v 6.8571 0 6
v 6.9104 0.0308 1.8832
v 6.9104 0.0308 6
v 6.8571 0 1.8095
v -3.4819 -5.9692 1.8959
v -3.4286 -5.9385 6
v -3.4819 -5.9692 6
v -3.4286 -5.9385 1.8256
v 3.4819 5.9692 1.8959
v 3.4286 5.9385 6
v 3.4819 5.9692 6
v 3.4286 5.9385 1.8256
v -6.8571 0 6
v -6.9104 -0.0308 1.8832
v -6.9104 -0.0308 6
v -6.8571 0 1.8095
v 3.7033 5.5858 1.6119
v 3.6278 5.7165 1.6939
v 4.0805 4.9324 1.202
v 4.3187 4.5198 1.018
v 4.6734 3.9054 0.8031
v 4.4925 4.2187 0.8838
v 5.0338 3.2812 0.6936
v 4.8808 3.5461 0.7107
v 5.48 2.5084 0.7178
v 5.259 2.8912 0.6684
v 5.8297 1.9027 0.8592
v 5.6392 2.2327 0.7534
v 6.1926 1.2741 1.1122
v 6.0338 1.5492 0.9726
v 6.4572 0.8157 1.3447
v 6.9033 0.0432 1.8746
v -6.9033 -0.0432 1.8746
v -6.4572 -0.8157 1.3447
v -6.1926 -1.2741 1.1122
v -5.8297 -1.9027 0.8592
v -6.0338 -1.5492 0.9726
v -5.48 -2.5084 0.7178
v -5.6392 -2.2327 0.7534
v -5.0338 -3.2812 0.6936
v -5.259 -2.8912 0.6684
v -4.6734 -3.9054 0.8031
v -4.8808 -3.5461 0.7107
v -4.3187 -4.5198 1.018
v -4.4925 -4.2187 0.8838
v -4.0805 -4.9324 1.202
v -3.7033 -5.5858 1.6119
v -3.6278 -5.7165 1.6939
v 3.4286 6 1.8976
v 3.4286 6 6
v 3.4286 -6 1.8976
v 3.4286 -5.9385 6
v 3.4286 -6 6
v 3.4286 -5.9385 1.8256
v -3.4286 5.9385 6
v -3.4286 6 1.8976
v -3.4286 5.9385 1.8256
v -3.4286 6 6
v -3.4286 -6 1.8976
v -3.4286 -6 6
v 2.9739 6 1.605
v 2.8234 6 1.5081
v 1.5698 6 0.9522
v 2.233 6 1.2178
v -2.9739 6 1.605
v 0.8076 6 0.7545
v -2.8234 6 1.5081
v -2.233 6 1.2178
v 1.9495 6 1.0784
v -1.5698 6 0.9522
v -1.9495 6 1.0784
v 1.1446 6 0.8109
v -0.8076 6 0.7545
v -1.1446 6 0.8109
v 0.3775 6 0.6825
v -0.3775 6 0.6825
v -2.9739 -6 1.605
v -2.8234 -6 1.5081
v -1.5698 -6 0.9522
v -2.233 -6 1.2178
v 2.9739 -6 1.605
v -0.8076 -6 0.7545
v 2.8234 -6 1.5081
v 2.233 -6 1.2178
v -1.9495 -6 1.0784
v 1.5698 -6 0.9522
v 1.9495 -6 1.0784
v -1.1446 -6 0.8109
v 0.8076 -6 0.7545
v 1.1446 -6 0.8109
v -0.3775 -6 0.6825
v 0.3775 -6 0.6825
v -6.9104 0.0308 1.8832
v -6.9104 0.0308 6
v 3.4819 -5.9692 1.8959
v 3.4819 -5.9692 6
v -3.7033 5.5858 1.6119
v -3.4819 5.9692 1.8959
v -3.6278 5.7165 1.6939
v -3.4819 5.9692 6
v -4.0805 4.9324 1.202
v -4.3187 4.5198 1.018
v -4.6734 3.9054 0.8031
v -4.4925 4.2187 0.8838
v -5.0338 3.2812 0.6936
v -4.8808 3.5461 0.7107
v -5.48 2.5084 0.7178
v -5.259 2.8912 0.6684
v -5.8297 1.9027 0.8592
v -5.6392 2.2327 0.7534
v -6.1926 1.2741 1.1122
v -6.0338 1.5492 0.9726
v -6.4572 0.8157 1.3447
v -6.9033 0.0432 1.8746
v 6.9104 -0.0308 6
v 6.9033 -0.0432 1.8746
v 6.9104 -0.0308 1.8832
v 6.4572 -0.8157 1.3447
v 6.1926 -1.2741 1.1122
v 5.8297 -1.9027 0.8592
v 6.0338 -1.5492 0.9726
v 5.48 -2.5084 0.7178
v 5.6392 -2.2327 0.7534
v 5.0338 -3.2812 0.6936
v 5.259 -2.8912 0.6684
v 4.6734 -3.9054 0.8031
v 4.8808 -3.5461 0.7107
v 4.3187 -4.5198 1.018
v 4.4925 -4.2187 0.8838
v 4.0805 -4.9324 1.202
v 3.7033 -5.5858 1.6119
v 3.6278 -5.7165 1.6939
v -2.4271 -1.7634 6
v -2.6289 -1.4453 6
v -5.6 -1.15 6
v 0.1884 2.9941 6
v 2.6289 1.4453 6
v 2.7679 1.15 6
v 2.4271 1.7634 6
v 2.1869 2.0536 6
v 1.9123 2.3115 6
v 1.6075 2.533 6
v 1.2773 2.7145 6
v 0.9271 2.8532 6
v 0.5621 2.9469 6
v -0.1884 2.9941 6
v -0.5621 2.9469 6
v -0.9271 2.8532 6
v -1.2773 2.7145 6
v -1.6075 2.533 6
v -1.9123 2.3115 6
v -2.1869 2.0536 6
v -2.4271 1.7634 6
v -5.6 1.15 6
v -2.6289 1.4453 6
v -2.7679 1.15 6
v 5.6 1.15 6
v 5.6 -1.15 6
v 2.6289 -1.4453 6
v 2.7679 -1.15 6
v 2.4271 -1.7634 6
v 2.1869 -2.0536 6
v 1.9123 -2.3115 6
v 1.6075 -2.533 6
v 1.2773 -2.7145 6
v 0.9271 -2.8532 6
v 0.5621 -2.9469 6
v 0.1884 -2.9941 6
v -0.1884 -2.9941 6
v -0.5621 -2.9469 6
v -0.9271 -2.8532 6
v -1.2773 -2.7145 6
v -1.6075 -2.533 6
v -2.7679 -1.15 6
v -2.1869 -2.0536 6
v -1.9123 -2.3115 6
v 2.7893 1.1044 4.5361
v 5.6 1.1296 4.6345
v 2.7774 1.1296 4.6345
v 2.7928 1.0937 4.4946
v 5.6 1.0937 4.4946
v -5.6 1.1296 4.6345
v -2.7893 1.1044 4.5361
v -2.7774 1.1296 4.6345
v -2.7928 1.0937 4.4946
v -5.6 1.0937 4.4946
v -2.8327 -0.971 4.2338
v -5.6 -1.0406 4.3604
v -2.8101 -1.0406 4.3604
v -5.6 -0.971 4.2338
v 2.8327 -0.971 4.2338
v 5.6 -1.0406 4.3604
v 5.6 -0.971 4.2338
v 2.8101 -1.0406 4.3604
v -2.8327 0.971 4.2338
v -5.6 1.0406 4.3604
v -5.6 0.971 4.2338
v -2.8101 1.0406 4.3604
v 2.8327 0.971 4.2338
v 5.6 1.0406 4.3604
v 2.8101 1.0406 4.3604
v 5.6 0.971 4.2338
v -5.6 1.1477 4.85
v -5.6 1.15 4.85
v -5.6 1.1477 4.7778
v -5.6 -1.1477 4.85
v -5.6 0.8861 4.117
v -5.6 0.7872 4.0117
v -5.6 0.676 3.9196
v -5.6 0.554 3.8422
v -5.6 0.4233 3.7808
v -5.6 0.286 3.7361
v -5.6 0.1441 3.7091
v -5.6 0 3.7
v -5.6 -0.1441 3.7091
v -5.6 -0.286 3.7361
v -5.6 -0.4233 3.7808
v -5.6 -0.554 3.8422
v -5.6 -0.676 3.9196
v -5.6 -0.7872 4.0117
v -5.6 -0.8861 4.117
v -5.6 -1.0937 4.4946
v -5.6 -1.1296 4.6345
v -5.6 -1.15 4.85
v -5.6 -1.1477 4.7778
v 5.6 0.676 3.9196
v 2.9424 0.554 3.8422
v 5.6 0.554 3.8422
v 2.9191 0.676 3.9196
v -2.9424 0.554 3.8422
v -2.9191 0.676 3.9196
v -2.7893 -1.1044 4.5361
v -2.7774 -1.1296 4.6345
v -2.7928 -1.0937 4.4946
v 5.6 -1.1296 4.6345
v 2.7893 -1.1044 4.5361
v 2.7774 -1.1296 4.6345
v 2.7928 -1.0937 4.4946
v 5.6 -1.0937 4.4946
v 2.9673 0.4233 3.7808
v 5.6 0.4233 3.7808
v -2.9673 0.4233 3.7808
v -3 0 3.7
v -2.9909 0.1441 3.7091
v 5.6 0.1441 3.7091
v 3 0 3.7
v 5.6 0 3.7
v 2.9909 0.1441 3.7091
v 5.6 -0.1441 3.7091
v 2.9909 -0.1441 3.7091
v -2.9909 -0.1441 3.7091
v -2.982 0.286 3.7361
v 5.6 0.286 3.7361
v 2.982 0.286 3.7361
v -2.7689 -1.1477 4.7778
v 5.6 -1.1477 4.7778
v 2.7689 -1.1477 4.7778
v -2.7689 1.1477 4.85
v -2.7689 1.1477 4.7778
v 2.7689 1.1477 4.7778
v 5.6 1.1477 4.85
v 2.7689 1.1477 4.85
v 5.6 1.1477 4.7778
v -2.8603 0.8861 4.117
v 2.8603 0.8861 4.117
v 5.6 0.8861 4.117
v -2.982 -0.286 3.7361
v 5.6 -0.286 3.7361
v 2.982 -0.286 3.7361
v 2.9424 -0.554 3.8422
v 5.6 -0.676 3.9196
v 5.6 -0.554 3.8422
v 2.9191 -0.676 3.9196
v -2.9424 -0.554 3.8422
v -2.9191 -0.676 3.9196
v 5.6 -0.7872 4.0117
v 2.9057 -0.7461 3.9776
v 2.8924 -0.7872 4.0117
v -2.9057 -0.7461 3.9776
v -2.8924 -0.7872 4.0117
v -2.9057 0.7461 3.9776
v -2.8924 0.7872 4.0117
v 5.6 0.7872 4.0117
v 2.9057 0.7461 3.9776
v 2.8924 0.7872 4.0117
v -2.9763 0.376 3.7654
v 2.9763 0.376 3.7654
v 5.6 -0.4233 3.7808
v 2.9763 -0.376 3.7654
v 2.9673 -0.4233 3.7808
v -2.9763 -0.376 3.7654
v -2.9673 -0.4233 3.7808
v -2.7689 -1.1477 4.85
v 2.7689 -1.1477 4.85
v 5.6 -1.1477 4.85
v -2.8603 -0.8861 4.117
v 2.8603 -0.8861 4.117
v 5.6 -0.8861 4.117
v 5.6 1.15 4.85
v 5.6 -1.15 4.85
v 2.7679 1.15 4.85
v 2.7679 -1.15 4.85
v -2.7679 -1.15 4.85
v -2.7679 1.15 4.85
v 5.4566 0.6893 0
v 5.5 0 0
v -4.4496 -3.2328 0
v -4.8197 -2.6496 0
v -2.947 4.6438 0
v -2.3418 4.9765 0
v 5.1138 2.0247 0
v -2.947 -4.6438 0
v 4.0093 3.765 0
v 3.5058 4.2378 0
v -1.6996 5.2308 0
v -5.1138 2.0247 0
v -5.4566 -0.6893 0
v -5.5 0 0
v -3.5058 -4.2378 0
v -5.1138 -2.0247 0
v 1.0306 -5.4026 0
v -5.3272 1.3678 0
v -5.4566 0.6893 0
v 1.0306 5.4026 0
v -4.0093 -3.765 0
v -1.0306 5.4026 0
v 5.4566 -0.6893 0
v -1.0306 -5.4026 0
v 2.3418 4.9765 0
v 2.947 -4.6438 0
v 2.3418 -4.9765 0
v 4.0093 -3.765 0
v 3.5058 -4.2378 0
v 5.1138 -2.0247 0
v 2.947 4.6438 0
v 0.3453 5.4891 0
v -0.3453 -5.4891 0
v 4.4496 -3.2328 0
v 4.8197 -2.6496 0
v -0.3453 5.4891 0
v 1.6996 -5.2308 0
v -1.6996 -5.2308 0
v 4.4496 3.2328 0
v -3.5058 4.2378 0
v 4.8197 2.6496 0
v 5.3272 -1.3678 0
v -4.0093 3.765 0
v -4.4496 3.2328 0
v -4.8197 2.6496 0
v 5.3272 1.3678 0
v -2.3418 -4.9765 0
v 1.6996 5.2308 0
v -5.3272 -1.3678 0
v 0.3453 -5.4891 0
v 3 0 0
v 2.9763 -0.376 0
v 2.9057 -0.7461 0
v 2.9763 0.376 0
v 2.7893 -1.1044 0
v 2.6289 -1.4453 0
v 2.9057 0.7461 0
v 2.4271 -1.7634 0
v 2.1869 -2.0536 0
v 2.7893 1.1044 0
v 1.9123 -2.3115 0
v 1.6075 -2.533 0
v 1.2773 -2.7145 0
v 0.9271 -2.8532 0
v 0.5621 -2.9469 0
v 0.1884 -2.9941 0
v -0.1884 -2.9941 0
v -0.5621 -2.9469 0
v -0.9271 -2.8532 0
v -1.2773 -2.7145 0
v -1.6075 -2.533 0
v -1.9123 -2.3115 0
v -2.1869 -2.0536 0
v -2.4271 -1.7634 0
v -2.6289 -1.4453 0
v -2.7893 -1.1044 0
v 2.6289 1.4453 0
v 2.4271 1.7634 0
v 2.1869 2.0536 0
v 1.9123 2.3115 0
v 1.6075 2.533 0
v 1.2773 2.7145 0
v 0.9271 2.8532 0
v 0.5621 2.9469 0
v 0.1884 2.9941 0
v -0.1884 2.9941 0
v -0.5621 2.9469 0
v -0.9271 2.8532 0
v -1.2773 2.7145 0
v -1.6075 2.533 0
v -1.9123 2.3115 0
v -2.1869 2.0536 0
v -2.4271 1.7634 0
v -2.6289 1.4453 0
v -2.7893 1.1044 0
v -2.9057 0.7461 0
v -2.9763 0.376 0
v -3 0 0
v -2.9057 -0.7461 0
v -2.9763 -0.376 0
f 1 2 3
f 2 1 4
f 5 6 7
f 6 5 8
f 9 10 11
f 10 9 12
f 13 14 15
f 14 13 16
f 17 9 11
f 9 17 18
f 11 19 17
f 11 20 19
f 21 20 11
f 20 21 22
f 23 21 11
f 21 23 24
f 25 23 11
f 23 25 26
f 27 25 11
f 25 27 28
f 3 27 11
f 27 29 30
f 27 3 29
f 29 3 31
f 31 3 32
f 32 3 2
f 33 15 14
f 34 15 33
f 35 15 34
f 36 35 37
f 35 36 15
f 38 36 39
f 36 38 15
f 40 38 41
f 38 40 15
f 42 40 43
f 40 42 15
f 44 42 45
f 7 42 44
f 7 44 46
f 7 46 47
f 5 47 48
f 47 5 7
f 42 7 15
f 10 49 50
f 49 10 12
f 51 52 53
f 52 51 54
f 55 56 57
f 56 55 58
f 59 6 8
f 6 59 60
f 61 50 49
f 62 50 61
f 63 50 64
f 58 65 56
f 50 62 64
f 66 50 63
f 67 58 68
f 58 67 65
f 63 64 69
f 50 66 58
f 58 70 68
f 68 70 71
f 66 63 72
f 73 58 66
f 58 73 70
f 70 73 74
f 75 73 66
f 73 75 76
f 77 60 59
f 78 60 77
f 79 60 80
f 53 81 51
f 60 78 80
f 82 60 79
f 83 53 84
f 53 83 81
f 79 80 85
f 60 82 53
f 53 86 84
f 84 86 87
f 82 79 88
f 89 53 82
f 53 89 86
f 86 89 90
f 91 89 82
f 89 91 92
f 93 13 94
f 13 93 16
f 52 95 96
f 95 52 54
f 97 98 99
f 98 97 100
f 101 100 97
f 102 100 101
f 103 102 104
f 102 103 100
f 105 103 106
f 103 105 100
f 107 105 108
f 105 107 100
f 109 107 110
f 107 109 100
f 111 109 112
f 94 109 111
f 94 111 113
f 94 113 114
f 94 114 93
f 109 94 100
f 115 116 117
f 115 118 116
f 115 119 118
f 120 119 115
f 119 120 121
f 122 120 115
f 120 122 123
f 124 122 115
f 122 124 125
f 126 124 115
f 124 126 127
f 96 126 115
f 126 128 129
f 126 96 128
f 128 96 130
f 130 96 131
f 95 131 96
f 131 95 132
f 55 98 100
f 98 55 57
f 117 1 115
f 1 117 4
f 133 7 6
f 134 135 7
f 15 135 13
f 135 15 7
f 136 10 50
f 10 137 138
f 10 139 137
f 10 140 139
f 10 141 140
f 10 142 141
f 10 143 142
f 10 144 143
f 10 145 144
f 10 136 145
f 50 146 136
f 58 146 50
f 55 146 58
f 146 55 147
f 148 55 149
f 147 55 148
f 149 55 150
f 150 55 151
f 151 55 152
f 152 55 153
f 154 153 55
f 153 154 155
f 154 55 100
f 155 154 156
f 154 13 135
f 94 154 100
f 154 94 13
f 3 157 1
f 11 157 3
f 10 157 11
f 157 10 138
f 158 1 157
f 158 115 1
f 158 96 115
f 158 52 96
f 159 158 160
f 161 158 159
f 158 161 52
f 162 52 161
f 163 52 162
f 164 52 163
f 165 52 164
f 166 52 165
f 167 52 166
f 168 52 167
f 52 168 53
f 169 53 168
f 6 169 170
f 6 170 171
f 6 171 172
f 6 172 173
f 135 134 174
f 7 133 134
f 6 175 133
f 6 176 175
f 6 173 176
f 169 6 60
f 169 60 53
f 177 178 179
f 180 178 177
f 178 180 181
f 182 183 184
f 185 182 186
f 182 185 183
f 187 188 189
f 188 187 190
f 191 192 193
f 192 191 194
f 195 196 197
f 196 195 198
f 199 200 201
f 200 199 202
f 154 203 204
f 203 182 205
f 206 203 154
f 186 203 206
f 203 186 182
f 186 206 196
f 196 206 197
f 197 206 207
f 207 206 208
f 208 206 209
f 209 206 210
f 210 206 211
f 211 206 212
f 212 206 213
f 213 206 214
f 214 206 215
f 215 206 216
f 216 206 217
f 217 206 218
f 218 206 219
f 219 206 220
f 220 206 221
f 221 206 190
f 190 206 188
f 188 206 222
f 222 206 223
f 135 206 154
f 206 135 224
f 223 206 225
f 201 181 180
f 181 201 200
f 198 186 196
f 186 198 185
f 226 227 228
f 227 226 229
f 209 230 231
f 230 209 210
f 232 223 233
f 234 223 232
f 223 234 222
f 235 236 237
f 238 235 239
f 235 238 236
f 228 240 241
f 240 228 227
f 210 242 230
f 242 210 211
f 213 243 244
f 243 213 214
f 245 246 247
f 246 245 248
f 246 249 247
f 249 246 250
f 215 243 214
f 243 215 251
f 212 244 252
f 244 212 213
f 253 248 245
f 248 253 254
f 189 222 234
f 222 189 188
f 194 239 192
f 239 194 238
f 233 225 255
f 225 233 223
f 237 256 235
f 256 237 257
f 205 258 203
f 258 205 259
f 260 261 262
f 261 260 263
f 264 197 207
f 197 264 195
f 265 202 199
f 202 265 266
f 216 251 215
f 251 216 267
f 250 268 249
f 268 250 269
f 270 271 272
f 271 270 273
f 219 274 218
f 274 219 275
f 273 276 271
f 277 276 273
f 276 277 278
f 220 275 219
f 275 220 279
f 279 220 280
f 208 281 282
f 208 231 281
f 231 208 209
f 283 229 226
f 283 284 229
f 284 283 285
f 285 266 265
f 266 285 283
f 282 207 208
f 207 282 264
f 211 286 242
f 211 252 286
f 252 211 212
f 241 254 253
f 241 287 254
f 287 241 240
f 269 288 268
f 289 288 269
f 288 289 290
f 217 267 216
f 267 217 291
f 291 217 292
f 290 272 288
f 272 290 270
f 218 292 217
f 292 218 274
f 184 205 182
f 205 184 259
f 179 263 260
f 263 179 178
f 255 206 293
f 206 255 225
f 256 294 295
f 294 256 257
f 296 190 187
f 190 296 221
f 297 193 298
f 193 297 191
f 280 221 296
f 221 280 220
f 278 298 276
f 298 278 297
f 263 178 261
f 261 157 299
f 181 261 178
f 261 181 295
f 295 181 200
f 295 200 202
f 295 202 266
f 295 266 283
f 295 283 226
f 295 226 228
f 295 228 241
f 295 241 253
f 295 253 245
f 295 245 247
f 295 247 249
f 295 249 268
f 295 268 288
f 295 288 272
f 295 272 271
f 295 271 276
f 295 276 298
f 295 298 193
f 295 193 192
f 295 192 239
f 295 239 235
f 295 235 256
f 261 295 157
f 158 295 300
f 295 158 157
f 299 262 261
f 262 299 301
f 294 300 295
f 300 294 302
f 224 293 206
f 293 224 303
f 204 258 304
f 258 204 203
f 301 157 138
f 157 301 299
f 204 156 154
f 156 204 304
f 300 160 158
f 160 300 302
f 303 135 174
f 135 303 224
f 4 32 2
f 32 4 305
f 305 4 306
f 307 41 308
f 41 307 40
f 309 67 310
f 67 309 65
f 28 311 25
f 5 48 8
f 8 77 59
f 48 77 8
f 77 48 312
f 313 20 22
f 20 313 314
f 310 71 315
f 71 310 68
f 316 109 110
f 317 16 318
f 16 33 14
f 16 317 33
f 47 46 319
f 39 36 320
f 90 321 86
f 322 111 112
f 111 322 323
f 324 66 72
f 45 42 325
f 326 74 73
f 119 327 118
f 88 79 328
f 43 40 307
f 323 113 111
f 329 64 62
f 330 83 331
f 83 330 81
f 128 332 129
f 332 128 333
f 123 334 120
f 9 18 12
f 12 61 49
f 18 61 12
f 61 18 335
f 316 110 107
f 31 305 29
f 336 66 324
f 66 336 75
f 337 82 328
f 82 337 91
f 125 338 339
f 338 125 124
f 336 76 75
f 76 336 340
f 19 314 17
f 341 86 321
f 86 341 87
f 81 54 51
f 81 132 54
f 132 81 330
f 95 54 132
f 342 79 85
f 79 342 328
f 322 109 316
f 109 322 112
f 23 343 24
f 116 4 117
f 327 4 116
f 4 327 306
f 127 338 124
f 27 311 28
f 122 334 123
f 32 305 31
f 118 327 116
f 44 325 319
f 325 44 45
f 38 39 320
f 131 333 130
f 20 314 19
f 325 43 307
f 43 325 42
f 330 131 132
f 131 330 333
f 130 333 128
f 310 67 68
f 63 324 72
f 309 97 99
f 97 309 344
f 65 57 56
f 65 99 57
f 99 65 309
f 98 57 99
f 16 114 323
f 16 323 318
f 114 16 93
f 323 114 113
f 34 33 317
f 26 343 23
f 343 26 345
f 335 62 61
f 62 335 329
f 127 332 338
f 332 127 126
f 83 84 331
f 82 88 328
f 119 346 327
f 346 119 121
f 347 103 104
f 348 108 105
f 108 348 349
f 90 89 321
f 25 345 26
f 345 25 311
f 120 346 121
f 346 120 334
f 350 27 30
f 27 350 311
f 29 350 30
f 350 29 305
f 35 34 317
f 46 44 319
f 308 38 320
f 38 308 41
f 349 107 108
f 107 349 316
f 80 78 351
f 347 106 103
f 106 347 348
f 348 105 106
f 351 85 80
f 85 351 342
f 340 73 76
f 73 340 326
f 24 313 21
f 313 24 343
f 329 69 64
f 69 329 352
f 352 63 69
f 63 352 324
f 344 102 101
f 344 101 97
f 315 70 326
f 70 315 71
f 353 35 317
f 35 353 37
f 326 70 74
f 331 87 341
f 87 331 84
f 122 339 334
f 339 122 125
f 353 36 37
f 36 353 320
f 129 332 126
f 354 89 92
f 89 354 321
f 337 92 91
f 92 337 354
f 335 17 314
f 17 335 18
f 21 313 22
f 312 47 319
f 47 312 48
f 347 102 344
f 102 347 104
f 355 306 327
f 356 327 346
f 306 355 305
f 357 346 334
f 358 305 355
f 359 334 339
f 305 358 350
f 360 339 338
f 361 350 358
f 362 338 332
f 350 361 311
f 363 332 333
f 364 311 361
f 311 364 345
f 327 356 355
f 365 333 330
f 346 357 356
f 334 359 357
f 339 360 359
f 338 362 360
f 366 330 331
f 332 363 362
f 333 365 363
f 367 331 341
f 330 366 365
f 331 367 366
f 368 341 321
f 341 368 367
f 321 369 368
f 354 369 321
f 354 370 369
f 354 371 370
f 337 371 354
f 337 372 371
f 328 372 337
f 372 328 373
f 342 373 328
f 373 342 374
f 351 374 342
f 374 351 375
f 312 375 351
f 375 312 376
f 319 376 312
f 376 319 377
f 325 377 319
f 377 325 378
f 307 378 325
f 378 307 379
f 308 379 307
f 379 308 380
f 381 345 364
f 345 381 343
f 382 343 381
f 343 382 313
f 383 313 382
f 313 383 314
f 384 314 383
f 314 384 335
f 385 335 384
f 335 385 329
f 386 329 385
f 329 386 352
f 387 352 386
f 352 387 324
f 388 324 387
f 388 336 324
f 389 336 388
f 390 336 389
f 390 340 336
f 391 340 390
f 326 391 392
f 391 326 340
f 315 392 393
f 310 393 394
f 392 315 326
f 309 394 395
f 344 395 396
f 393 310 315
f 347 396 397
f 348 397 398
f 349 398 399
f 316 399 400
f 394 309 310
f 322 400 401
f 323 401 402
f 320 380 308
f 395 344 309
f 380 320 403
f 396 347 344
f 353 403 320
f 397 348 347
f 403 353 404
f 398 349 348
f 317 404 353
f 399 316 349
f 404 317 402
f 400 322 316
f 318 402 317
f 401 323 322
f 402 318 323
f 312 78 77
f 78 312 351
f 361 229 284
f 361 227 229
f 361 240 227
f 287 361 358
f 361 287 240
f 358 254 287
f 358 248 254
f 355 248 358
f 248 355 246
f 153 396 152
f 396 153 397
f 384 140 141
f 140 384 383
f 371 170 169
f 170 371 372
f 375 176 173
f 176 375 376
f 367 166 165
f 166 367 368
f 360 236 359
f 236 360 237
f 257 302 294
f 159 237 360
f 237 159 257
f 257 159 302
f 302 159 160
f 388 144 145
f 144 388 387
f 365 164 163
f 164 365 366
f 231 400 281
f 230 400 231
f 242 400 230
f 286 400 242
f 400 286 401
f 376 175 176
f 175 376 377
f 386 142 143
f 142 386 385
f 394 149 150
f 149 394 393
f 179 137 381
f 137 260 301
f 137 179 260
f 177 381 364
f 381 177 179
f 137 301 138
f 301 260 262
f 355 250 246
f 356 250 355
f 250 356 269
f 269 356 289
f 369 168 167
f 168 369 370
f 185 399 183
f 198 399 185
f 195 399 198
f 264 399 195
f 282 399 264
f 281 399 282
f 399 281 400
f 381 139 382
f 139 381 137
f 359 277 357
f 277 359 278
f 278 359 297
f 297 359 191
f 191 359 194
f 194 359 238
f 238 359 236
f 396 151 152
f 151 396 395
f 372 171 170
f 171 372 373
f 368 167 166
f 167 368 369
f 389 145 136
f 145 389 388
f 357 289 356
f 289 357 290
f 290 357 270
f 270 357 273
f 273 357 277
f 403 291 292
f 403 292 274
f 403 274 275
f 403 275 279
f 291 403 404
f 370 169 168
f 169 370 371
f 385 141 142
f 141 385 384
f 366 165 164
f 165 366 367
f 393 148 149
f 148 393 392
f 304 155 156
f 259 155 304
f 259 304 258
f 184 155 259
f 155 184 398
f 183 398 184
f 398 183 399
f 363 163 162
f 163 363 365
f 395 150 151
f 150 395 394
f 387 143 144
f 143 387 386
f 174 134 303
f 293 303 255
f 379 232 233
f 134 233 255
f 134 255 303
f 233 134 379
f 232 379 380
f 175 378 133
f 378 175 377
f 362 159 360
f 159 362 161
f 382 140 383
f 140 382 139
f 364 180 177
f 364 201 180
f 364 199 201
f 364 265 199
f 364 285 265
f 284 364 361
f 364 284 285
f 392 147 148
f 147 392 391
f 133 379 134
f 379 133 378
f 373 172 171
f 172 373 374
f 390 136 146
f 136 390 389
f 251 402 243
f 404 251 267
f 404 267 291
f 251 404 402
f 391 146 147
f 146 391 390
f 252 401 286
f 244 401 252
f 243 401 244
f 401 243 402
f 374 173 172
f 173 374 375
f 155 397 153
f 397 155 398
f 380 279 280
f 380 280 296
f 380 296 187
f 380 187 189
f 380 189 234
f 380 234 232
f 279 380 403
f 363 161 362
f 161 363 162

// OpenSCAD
// [FL_INDEX: keywords="openscad, 3d_parametric, RC_car_wheel_12mm_hex_hub_nut__customizer-enabled, csg_solid" | COT="Parametric OpenSCAD design from 3DCodeverse"]
// Title: RC car wheel 12mm hex hub nut (customizer-enabled)

include <MCAD/shapes.scad>;

$fn = 50;	// rounded edge quality (# of faces per 360 degrees)

hex_mm = 12;		// adjust hex size, default 12
// HEX PART HEIGHT -- MODIFY THIS!
hex_height = 6;	// adjust your rim offset, default 6
pin_depth = 2.3;	// adjust for deeper or shallower pin engagement depth, default 2.3
pin_length = 11.2;	// length of axle pin, default 11.2
pin_width = 2.3;	// width of axle pin, default 2.3
axle_hole = 3;		// axle hole diameter, default 3
flare_height = 2;	// flare lead-in up the side of the hex body, default 2

difference(){	// put hole all the way through
	union(){	// combine fillet shape (base) with rest of hex body
		difference(){	// cut rectangular slot from hex body
			translate([0,0,(hex_height-flare_height-((hex_height-6)/2))]) hexagon(hex_mm,(hex_height-flare_height));	// 12mm hex
			 translate([0,0,(hex_height-(pin_depth/2))]) rotate([90,90,90]) cylinder(pin_length,(pin_depth/2),(pin_depth/2), center = true);	// pin cut-out cylinder
			 translate([(pin_length/2*-1),(pin_width/2*-1),(hex_height-(pin_depth/2))]) cube(size=[pin_length,pin_width,pin_depth+1], center = false);	// pin cut-out rectangle
		}
		difference(){	// clear anything extending beyond hex_mm size
			cylinder(flare_height,5.5,7);	// flared-out cylinder to create fillet
			difference(){	// chop off extra bits of flared-out cylinder
				hexagon((hex_mm+3),(flare_height*2));	// hex "od"
				hexagon(hex_mm,(flare_height*2));		// hex "id"
				}
		}
	}
	cylinder(hex_height,axle_hole,axle_hole);
}
